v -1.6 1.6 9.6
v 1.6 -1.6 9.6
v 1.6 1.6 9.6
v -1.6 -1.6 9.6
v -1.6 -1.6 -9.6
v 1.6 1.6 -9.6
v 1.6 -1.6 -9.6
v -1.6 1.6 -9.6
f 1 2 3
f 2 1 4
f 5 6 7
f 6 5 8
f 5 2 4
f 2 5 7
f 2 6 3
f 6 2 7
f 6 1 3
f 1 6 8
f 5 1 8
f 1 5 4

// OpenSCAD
size = 32;//block=32 //item=8

cube([size * 0.10, size * 0.10, size * 0.60], center = true);
